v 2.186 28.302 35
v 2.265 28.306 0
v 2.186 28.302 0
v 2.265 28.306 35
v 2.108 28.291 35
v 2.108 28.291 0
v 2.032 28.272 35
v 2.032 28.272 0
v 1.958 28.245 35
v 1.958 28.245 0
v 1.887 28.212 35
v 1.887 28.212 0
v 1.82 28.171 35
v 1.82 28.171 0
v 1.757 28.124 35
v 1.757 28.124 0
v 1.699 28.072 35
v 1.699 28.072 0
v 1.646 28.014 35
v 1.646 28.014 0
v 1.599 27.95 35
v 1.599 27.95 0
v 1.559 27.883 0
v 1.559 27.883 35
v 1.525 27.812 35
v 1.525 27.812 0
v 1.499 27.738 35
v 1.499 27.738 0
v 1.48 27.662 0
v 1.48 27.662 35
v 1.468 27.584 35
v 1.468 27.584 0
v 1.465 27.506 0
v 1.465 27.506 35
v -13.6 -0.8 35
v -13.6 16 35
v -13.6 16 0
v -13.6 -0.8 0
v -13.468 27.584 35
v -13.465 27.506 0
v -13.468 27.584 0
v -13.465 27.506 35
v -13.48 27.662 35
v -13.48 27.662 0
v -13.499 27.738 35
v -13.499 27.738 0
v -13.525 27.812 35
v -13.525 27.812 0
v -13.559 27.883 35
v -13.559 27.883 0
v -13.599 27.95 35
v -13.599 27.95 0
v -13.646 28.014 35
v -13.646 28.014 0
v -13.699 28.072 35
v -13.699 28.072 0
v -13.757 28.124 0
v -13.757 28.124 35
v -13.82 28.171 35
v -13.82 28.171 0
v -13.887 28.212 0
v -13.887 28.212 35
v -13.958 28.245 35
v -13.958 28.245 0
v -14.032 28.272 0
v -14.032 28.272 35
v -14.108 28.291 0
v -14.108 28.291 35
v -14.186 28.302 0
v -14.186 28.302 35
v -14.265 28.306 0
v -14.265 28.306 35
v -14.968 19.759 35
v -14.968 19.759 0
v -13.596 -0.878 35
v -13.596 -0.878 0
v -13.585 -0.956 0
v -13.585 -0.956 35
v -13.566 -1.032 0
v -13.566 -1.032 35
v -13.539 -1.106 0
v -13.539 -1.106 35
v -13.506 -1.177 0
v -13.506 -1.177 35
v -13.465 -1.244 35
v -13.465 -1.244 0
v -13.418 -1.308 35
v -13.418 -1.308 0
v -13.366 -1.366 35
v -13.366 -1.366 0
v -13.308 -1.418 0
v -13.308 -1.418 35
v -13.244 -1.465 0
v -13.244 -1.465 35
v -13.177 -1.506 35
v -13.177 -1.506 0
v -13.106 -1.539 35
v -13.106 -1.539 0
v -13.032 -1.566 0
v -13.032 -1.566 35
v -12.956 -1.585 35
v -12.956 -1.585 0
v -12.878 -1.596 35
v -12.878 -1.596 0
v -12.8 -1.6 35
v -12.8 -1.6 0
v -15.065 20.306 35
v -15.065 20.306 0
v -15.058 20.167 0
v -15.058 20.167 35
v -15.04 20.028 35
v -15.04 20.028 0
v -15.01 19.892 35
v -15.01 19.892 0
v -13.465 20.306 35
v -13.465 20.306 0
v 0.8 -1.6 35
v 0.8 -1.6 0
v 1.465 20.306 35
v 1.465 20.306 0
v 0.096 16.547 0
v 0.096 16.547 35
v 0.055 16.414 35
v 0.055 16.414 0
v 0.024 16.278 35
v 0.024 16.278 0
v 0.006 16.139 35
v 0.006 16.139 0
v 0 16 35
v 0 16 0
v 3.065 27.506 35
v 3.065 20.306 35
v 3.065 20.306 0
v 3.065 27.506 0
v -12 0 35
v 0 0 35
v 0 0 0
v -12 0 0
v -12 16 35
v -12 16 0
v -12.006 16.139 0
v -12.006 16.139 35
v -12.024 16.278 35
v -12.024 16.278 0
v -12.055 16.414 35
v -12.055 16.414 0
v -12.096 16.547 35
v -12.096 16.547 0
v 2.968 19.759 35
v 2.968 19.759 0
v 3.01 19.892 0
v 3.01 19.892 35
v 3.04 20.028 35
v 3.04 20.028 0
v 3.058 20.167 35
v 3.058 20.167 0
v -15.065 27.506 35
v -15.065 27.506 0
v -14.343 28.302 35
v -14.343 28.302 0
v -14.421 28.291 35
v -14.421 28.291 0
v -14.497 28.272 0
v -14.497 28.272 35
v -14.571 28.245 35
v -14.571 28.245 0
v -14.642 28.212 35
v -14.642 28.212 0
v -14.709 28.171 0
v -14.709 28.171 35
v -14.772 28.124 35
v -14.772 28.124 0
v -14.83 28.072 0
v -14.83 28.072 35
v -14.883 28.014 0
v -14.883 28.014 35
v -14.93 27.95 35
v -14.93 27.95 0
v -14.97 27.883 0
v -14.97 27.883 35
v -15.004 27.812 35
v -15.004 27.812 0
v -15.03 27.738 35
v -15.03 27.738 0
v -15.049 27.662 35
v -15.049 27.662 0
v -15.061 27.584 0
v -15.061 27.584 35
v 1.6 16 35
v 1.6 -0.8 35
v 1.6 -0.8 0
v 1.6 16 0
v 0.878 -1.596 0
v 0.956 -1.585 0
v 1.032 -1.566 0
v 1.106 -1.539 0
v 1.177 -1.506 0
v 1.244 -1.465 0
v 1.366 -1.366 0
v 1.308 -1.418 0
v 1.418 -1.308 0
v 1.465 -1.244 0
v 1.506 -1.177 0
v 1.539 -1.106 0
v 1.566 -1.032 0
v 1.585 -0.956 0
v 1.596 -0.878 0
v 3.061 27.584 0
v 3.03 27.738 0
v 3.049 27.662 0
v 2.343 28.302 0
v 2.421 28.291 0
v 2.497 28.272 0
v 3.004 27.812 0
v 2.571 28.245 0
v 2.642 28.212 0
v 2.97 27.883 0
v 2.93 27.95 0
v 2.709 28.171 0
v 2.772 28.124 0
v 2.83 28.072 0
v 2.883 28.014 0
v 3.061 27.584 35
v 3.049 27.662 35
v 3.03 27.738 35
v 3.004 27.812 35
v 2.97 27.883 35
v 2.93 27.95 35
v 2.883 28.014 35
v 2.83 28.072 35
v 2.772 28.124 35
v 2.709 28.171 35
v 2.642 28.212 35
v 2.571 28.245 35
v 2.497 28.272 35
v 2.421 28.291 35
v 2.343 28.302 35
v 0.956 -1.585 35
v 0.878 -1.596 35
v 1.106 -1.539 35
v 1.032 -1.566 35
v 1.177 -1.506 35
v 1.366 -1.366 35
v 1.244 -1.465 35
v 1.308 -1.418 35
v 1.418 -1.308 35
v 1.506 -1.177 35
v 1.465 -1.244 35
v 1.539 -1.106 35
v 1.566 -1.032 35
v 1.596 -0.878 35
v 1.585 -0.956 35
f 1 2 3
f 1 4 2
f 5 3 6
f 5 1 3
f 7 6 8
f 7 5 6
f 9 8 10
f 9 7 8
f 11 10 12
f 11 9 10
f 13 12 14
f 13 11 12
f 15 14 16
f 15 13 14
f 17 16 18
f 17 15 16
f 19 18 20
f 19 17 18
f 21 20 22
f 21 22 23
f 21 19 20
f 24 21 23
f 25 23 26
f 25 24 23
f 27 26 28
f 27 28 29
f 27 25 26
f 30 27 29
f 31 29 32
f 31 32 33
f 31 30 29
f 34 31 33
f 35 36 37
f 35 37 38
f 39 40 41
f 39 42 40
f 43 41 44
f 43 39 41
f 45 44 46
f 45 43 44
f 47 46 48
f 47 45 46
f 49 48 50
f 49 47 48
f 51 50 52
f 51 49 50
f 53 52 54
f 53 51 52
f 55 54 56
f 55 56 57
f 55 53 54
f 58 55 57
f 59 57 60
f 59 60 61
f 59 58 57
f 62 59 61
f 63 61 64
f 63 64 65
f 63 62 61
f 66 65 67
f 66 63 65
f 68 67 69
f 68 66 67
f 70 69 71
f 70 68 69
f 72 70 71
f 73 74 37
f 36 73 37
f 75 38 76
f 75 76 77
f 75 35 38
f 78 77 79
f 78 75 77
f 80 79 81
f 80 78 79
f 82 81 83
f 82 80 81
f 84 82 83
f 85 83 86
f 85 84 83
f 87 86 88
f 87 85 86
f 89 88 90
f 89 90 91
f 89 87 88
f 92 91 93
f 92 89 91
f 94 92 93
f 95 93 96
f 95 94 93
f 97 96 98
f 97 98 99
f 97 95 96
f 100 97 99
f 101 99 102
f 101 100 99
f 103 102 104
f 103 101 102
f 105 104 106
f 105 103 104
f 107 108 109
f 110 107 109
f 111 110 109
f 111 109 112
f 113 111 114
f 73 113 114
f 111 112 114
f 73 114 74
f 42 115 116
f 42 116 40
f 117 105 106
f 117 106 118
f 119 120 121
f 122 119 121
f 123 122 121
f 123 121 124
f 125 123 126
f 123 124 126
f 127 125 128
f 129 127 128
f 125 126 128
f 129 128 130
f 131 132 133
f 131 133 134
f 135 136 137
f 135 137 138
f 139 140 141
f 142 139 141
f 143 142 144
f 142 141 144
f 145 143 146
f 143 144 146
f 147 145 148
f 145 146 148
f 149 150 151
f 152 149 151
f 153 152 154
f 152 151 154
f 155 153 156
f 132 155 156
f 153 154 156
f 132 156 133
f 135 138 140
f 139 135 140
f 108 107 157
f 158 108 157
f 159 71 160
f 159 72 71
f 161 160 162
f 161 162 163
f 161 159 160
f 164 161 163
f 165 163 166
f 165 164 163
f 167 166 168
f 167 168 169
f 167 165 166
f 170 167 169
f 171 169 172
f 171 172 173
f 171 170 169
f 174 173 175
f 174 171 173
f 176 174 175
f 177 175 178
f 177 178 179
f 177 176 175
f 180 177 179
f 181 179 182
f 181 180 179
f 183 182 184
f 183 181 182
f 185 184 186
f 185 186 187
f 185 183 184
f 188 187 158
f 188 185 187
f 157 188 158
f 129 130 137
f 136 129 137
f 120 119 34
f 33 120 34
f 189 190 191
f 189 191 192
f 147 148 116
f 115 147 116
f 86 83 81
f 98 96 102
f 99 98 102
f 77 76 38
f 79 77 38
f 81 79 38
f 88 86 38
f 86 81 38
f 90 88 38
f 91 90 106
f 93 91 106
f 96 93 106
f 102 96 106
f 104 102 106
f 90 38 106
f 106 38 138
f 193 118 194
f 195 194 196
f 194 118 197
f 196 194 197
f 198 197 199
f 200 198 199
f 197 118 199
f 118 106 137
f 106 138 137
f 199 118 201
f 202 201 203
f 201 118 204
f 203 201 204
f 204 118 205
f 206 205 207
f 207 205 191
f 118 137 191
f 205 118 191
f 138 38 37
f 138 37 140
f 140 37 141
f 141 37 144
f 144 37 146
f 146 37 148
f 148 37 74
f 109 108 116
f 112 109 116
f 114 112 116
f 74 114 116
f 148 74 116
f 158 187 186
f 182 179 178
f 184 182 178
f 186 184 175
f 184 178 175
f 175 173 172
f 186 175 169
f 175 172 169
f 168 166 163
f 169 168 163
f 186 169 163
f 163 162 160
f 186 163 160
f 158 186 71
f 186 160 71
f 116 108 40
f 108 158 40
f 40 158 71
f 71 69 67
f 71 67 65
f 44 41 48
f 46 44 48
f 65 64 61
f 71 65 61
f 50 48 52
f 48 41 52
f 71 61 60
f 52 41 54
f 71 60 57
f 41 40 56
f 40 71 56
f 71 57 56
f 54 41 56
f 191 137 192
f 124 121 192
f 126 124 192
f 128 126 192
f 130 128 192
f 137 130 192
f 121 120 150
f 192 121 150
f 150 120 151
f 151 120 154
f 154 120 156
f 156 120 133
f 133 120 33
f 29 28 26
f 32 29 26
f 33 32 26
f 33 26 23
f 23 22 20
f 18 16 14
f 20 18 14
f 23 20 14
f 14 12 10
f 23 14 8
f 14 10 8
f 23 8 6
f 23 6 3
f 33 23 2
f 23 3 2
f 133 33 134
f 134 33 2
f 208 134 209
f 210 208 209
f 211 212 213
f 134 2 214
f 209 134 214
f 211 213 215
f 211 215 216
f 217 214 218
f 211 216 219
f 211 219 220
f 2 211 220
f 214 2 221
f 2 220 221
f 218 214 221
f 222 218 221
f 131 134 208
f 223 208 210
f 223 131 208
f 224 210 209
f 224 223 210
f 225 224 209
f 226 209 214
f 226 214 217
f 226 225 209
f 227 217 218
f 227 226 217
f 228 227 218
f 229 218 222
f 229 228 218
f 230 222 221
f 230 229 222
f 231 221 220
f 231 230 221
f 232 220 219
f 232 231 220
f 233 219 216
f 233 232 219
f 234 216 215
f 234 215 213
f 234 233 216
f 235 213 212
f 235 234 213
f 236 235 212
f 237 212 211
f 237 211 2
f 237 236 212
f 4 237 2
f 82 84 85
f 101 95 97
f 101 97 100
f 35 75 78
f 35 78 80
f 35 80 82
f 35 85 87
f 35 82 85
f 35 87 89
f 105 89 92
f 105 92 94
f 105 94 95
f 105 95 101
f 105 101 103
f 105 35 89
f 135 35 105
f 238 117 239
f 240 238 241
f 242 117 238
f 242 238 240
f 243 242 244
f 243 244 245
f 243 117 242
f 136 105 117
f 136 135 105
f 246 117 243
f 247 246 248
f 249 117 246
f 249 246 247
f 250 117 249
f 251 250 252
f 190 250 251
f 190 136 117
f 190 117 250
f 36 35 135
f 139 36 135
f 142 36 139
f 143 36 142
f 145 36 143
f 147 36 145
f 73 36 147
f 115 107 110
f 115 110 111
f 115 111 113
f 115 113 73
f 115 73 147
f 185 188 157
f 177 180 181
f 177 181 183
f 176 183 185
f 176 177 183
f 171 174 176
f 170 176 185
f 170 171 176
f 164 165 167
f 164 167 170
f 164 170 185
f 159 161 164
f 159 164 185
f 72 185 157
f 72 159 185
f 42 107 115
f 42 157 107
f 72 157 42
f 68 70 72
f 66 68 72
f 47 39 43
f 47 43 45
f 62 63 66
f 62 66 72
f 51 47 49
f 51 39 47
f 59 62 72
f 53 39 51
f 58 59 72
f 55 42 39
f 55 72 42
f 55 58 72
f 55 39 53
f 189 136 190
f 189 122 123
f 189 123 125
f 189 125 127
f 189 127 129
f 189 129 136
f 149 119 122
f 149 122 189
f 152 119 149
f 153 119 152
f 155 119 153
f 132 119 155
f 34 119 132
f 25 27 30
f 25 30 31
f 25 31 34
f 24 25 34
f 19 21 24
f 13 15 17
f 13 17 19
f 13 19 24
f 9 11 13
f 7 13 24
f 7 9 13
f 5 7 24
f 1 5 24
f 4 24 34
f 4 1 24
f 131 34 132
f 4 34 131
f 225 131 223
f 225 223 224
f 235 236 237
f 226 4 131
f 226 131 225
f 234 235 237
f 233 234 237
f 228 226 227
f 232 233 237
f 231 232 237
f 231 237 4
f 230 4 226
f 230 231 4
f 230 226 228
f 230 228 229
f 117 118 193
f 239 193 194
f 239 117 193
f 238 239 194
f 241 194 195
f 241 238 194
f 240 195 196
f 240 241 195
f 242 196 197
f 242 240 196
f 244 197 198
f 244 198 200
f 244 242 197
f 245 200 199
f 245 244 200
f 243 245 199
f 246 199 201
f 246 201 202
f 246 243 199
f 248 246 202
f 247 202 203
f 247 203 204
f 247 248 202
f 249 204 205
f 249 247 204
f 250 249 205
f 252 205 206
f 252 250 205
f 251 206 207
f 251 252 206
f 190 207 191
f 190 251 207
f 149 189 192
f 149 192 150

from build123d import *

# Parameters (mm, degrees)
F0_W     = 1.6
F0_H     = 8
F1_DEPTH = 35
F2_R     = 0.79999


# Not quite as in the source:
# - a fillet or chamfer is up to 0.001 mm smaller than in the source, because OpenCascade refuses the exact size


with BuildPart() as f1:
    # F0 (on Top) → F1 (new body)
    with BuildSketch(Plane.XY):
        Polygon((0, 16), (0, 0), (-12, 0), (-12, 16), (-13.6, 16), (-13.6, -1.6), (1.6, -1.6), (1.6, 16), align=None)
        with BuildLine():
            ThreePointArc((0.0964918067, 16.5472322293), (0.0243075952, 16.2778370843), (0, 16))
            Line((0, 16), (1.6, 16))
            Line((1.6, 16), (0.0964918067, 16.5472322293))
        make_face()
        with BuildLine():
            Line((-13.6, 16), (-12, 16))
            ThreePointArc((-12, 16), (-12.0243075952, 16.2778370843), (-12.0964918067, 16.5472322293))
            Line((-12.0964918067, 16.5472322293), (-13.6, 16))
        make_face()
        Polygon((0.0964918067, 16.5472322293), (1.6, 16), (2.9680805733, 19.7587704831), (1.46457238, 20.3060027125), align=None)
        Polygon((-14.9680805733, 19.7587704831), (-13.6, 16), (-12.0964918067, 16.5472322293), (-13.46457238, 20.3060027125), align=None)
        with BuildLine():
            Line((1.46457238, 20.3060027125), (2.9680805733, 19.7587704831))
            ThreePointArc((2.9680805733, 19.7587704831), (3.0402647849, 20.0281656282), (3.06457238, 20.3060027125))
            Line((3.06457238, 20.3060027125), (1.46457238, 20.3060027125))
        make_face()
        with Locations((2.26457238, 24.3060027125)):
            Rectangle(F0_W, F0_H)
        with BuildLine():
            ThreePointArc((-15.06457238, 20.3060027125), (-15.0402647849, 20.0281656282), (-14.9680805733, 19.7587704831))
            Line((-14.9680805733, 19.7587704831), (-13.46457238, 20.3060027125))
            Line((-13.46457238, 20.3060027125), (-15.06457238, 20.3060027125))
        make_face()
        with Locations((-14.26457238, 24.3060027125)):
            Rectangle(F0_W, F0_H)
    extrude(amount=F1_DEPTH)

    # F2 (radius 0.8 in the source; OpenCascade refuses exactly that, so slightly less here)
    f2_edges = [f1.edges().sort_by_distance(p)[0] for p in [
        (1.6, -1.6, 17.5),
        (-13.6, -1.6, 17.5),
        (-15.064572, 28.306003, 17.5),
        (3.064572, 28.306003, 17.5),
        (1.464572, 28.306003, 17.5),
        (-13.464572, 28.306003, 17.5),
    ]]
    fillet(f2_edges, radius=F2_R)


solid = f1.part
